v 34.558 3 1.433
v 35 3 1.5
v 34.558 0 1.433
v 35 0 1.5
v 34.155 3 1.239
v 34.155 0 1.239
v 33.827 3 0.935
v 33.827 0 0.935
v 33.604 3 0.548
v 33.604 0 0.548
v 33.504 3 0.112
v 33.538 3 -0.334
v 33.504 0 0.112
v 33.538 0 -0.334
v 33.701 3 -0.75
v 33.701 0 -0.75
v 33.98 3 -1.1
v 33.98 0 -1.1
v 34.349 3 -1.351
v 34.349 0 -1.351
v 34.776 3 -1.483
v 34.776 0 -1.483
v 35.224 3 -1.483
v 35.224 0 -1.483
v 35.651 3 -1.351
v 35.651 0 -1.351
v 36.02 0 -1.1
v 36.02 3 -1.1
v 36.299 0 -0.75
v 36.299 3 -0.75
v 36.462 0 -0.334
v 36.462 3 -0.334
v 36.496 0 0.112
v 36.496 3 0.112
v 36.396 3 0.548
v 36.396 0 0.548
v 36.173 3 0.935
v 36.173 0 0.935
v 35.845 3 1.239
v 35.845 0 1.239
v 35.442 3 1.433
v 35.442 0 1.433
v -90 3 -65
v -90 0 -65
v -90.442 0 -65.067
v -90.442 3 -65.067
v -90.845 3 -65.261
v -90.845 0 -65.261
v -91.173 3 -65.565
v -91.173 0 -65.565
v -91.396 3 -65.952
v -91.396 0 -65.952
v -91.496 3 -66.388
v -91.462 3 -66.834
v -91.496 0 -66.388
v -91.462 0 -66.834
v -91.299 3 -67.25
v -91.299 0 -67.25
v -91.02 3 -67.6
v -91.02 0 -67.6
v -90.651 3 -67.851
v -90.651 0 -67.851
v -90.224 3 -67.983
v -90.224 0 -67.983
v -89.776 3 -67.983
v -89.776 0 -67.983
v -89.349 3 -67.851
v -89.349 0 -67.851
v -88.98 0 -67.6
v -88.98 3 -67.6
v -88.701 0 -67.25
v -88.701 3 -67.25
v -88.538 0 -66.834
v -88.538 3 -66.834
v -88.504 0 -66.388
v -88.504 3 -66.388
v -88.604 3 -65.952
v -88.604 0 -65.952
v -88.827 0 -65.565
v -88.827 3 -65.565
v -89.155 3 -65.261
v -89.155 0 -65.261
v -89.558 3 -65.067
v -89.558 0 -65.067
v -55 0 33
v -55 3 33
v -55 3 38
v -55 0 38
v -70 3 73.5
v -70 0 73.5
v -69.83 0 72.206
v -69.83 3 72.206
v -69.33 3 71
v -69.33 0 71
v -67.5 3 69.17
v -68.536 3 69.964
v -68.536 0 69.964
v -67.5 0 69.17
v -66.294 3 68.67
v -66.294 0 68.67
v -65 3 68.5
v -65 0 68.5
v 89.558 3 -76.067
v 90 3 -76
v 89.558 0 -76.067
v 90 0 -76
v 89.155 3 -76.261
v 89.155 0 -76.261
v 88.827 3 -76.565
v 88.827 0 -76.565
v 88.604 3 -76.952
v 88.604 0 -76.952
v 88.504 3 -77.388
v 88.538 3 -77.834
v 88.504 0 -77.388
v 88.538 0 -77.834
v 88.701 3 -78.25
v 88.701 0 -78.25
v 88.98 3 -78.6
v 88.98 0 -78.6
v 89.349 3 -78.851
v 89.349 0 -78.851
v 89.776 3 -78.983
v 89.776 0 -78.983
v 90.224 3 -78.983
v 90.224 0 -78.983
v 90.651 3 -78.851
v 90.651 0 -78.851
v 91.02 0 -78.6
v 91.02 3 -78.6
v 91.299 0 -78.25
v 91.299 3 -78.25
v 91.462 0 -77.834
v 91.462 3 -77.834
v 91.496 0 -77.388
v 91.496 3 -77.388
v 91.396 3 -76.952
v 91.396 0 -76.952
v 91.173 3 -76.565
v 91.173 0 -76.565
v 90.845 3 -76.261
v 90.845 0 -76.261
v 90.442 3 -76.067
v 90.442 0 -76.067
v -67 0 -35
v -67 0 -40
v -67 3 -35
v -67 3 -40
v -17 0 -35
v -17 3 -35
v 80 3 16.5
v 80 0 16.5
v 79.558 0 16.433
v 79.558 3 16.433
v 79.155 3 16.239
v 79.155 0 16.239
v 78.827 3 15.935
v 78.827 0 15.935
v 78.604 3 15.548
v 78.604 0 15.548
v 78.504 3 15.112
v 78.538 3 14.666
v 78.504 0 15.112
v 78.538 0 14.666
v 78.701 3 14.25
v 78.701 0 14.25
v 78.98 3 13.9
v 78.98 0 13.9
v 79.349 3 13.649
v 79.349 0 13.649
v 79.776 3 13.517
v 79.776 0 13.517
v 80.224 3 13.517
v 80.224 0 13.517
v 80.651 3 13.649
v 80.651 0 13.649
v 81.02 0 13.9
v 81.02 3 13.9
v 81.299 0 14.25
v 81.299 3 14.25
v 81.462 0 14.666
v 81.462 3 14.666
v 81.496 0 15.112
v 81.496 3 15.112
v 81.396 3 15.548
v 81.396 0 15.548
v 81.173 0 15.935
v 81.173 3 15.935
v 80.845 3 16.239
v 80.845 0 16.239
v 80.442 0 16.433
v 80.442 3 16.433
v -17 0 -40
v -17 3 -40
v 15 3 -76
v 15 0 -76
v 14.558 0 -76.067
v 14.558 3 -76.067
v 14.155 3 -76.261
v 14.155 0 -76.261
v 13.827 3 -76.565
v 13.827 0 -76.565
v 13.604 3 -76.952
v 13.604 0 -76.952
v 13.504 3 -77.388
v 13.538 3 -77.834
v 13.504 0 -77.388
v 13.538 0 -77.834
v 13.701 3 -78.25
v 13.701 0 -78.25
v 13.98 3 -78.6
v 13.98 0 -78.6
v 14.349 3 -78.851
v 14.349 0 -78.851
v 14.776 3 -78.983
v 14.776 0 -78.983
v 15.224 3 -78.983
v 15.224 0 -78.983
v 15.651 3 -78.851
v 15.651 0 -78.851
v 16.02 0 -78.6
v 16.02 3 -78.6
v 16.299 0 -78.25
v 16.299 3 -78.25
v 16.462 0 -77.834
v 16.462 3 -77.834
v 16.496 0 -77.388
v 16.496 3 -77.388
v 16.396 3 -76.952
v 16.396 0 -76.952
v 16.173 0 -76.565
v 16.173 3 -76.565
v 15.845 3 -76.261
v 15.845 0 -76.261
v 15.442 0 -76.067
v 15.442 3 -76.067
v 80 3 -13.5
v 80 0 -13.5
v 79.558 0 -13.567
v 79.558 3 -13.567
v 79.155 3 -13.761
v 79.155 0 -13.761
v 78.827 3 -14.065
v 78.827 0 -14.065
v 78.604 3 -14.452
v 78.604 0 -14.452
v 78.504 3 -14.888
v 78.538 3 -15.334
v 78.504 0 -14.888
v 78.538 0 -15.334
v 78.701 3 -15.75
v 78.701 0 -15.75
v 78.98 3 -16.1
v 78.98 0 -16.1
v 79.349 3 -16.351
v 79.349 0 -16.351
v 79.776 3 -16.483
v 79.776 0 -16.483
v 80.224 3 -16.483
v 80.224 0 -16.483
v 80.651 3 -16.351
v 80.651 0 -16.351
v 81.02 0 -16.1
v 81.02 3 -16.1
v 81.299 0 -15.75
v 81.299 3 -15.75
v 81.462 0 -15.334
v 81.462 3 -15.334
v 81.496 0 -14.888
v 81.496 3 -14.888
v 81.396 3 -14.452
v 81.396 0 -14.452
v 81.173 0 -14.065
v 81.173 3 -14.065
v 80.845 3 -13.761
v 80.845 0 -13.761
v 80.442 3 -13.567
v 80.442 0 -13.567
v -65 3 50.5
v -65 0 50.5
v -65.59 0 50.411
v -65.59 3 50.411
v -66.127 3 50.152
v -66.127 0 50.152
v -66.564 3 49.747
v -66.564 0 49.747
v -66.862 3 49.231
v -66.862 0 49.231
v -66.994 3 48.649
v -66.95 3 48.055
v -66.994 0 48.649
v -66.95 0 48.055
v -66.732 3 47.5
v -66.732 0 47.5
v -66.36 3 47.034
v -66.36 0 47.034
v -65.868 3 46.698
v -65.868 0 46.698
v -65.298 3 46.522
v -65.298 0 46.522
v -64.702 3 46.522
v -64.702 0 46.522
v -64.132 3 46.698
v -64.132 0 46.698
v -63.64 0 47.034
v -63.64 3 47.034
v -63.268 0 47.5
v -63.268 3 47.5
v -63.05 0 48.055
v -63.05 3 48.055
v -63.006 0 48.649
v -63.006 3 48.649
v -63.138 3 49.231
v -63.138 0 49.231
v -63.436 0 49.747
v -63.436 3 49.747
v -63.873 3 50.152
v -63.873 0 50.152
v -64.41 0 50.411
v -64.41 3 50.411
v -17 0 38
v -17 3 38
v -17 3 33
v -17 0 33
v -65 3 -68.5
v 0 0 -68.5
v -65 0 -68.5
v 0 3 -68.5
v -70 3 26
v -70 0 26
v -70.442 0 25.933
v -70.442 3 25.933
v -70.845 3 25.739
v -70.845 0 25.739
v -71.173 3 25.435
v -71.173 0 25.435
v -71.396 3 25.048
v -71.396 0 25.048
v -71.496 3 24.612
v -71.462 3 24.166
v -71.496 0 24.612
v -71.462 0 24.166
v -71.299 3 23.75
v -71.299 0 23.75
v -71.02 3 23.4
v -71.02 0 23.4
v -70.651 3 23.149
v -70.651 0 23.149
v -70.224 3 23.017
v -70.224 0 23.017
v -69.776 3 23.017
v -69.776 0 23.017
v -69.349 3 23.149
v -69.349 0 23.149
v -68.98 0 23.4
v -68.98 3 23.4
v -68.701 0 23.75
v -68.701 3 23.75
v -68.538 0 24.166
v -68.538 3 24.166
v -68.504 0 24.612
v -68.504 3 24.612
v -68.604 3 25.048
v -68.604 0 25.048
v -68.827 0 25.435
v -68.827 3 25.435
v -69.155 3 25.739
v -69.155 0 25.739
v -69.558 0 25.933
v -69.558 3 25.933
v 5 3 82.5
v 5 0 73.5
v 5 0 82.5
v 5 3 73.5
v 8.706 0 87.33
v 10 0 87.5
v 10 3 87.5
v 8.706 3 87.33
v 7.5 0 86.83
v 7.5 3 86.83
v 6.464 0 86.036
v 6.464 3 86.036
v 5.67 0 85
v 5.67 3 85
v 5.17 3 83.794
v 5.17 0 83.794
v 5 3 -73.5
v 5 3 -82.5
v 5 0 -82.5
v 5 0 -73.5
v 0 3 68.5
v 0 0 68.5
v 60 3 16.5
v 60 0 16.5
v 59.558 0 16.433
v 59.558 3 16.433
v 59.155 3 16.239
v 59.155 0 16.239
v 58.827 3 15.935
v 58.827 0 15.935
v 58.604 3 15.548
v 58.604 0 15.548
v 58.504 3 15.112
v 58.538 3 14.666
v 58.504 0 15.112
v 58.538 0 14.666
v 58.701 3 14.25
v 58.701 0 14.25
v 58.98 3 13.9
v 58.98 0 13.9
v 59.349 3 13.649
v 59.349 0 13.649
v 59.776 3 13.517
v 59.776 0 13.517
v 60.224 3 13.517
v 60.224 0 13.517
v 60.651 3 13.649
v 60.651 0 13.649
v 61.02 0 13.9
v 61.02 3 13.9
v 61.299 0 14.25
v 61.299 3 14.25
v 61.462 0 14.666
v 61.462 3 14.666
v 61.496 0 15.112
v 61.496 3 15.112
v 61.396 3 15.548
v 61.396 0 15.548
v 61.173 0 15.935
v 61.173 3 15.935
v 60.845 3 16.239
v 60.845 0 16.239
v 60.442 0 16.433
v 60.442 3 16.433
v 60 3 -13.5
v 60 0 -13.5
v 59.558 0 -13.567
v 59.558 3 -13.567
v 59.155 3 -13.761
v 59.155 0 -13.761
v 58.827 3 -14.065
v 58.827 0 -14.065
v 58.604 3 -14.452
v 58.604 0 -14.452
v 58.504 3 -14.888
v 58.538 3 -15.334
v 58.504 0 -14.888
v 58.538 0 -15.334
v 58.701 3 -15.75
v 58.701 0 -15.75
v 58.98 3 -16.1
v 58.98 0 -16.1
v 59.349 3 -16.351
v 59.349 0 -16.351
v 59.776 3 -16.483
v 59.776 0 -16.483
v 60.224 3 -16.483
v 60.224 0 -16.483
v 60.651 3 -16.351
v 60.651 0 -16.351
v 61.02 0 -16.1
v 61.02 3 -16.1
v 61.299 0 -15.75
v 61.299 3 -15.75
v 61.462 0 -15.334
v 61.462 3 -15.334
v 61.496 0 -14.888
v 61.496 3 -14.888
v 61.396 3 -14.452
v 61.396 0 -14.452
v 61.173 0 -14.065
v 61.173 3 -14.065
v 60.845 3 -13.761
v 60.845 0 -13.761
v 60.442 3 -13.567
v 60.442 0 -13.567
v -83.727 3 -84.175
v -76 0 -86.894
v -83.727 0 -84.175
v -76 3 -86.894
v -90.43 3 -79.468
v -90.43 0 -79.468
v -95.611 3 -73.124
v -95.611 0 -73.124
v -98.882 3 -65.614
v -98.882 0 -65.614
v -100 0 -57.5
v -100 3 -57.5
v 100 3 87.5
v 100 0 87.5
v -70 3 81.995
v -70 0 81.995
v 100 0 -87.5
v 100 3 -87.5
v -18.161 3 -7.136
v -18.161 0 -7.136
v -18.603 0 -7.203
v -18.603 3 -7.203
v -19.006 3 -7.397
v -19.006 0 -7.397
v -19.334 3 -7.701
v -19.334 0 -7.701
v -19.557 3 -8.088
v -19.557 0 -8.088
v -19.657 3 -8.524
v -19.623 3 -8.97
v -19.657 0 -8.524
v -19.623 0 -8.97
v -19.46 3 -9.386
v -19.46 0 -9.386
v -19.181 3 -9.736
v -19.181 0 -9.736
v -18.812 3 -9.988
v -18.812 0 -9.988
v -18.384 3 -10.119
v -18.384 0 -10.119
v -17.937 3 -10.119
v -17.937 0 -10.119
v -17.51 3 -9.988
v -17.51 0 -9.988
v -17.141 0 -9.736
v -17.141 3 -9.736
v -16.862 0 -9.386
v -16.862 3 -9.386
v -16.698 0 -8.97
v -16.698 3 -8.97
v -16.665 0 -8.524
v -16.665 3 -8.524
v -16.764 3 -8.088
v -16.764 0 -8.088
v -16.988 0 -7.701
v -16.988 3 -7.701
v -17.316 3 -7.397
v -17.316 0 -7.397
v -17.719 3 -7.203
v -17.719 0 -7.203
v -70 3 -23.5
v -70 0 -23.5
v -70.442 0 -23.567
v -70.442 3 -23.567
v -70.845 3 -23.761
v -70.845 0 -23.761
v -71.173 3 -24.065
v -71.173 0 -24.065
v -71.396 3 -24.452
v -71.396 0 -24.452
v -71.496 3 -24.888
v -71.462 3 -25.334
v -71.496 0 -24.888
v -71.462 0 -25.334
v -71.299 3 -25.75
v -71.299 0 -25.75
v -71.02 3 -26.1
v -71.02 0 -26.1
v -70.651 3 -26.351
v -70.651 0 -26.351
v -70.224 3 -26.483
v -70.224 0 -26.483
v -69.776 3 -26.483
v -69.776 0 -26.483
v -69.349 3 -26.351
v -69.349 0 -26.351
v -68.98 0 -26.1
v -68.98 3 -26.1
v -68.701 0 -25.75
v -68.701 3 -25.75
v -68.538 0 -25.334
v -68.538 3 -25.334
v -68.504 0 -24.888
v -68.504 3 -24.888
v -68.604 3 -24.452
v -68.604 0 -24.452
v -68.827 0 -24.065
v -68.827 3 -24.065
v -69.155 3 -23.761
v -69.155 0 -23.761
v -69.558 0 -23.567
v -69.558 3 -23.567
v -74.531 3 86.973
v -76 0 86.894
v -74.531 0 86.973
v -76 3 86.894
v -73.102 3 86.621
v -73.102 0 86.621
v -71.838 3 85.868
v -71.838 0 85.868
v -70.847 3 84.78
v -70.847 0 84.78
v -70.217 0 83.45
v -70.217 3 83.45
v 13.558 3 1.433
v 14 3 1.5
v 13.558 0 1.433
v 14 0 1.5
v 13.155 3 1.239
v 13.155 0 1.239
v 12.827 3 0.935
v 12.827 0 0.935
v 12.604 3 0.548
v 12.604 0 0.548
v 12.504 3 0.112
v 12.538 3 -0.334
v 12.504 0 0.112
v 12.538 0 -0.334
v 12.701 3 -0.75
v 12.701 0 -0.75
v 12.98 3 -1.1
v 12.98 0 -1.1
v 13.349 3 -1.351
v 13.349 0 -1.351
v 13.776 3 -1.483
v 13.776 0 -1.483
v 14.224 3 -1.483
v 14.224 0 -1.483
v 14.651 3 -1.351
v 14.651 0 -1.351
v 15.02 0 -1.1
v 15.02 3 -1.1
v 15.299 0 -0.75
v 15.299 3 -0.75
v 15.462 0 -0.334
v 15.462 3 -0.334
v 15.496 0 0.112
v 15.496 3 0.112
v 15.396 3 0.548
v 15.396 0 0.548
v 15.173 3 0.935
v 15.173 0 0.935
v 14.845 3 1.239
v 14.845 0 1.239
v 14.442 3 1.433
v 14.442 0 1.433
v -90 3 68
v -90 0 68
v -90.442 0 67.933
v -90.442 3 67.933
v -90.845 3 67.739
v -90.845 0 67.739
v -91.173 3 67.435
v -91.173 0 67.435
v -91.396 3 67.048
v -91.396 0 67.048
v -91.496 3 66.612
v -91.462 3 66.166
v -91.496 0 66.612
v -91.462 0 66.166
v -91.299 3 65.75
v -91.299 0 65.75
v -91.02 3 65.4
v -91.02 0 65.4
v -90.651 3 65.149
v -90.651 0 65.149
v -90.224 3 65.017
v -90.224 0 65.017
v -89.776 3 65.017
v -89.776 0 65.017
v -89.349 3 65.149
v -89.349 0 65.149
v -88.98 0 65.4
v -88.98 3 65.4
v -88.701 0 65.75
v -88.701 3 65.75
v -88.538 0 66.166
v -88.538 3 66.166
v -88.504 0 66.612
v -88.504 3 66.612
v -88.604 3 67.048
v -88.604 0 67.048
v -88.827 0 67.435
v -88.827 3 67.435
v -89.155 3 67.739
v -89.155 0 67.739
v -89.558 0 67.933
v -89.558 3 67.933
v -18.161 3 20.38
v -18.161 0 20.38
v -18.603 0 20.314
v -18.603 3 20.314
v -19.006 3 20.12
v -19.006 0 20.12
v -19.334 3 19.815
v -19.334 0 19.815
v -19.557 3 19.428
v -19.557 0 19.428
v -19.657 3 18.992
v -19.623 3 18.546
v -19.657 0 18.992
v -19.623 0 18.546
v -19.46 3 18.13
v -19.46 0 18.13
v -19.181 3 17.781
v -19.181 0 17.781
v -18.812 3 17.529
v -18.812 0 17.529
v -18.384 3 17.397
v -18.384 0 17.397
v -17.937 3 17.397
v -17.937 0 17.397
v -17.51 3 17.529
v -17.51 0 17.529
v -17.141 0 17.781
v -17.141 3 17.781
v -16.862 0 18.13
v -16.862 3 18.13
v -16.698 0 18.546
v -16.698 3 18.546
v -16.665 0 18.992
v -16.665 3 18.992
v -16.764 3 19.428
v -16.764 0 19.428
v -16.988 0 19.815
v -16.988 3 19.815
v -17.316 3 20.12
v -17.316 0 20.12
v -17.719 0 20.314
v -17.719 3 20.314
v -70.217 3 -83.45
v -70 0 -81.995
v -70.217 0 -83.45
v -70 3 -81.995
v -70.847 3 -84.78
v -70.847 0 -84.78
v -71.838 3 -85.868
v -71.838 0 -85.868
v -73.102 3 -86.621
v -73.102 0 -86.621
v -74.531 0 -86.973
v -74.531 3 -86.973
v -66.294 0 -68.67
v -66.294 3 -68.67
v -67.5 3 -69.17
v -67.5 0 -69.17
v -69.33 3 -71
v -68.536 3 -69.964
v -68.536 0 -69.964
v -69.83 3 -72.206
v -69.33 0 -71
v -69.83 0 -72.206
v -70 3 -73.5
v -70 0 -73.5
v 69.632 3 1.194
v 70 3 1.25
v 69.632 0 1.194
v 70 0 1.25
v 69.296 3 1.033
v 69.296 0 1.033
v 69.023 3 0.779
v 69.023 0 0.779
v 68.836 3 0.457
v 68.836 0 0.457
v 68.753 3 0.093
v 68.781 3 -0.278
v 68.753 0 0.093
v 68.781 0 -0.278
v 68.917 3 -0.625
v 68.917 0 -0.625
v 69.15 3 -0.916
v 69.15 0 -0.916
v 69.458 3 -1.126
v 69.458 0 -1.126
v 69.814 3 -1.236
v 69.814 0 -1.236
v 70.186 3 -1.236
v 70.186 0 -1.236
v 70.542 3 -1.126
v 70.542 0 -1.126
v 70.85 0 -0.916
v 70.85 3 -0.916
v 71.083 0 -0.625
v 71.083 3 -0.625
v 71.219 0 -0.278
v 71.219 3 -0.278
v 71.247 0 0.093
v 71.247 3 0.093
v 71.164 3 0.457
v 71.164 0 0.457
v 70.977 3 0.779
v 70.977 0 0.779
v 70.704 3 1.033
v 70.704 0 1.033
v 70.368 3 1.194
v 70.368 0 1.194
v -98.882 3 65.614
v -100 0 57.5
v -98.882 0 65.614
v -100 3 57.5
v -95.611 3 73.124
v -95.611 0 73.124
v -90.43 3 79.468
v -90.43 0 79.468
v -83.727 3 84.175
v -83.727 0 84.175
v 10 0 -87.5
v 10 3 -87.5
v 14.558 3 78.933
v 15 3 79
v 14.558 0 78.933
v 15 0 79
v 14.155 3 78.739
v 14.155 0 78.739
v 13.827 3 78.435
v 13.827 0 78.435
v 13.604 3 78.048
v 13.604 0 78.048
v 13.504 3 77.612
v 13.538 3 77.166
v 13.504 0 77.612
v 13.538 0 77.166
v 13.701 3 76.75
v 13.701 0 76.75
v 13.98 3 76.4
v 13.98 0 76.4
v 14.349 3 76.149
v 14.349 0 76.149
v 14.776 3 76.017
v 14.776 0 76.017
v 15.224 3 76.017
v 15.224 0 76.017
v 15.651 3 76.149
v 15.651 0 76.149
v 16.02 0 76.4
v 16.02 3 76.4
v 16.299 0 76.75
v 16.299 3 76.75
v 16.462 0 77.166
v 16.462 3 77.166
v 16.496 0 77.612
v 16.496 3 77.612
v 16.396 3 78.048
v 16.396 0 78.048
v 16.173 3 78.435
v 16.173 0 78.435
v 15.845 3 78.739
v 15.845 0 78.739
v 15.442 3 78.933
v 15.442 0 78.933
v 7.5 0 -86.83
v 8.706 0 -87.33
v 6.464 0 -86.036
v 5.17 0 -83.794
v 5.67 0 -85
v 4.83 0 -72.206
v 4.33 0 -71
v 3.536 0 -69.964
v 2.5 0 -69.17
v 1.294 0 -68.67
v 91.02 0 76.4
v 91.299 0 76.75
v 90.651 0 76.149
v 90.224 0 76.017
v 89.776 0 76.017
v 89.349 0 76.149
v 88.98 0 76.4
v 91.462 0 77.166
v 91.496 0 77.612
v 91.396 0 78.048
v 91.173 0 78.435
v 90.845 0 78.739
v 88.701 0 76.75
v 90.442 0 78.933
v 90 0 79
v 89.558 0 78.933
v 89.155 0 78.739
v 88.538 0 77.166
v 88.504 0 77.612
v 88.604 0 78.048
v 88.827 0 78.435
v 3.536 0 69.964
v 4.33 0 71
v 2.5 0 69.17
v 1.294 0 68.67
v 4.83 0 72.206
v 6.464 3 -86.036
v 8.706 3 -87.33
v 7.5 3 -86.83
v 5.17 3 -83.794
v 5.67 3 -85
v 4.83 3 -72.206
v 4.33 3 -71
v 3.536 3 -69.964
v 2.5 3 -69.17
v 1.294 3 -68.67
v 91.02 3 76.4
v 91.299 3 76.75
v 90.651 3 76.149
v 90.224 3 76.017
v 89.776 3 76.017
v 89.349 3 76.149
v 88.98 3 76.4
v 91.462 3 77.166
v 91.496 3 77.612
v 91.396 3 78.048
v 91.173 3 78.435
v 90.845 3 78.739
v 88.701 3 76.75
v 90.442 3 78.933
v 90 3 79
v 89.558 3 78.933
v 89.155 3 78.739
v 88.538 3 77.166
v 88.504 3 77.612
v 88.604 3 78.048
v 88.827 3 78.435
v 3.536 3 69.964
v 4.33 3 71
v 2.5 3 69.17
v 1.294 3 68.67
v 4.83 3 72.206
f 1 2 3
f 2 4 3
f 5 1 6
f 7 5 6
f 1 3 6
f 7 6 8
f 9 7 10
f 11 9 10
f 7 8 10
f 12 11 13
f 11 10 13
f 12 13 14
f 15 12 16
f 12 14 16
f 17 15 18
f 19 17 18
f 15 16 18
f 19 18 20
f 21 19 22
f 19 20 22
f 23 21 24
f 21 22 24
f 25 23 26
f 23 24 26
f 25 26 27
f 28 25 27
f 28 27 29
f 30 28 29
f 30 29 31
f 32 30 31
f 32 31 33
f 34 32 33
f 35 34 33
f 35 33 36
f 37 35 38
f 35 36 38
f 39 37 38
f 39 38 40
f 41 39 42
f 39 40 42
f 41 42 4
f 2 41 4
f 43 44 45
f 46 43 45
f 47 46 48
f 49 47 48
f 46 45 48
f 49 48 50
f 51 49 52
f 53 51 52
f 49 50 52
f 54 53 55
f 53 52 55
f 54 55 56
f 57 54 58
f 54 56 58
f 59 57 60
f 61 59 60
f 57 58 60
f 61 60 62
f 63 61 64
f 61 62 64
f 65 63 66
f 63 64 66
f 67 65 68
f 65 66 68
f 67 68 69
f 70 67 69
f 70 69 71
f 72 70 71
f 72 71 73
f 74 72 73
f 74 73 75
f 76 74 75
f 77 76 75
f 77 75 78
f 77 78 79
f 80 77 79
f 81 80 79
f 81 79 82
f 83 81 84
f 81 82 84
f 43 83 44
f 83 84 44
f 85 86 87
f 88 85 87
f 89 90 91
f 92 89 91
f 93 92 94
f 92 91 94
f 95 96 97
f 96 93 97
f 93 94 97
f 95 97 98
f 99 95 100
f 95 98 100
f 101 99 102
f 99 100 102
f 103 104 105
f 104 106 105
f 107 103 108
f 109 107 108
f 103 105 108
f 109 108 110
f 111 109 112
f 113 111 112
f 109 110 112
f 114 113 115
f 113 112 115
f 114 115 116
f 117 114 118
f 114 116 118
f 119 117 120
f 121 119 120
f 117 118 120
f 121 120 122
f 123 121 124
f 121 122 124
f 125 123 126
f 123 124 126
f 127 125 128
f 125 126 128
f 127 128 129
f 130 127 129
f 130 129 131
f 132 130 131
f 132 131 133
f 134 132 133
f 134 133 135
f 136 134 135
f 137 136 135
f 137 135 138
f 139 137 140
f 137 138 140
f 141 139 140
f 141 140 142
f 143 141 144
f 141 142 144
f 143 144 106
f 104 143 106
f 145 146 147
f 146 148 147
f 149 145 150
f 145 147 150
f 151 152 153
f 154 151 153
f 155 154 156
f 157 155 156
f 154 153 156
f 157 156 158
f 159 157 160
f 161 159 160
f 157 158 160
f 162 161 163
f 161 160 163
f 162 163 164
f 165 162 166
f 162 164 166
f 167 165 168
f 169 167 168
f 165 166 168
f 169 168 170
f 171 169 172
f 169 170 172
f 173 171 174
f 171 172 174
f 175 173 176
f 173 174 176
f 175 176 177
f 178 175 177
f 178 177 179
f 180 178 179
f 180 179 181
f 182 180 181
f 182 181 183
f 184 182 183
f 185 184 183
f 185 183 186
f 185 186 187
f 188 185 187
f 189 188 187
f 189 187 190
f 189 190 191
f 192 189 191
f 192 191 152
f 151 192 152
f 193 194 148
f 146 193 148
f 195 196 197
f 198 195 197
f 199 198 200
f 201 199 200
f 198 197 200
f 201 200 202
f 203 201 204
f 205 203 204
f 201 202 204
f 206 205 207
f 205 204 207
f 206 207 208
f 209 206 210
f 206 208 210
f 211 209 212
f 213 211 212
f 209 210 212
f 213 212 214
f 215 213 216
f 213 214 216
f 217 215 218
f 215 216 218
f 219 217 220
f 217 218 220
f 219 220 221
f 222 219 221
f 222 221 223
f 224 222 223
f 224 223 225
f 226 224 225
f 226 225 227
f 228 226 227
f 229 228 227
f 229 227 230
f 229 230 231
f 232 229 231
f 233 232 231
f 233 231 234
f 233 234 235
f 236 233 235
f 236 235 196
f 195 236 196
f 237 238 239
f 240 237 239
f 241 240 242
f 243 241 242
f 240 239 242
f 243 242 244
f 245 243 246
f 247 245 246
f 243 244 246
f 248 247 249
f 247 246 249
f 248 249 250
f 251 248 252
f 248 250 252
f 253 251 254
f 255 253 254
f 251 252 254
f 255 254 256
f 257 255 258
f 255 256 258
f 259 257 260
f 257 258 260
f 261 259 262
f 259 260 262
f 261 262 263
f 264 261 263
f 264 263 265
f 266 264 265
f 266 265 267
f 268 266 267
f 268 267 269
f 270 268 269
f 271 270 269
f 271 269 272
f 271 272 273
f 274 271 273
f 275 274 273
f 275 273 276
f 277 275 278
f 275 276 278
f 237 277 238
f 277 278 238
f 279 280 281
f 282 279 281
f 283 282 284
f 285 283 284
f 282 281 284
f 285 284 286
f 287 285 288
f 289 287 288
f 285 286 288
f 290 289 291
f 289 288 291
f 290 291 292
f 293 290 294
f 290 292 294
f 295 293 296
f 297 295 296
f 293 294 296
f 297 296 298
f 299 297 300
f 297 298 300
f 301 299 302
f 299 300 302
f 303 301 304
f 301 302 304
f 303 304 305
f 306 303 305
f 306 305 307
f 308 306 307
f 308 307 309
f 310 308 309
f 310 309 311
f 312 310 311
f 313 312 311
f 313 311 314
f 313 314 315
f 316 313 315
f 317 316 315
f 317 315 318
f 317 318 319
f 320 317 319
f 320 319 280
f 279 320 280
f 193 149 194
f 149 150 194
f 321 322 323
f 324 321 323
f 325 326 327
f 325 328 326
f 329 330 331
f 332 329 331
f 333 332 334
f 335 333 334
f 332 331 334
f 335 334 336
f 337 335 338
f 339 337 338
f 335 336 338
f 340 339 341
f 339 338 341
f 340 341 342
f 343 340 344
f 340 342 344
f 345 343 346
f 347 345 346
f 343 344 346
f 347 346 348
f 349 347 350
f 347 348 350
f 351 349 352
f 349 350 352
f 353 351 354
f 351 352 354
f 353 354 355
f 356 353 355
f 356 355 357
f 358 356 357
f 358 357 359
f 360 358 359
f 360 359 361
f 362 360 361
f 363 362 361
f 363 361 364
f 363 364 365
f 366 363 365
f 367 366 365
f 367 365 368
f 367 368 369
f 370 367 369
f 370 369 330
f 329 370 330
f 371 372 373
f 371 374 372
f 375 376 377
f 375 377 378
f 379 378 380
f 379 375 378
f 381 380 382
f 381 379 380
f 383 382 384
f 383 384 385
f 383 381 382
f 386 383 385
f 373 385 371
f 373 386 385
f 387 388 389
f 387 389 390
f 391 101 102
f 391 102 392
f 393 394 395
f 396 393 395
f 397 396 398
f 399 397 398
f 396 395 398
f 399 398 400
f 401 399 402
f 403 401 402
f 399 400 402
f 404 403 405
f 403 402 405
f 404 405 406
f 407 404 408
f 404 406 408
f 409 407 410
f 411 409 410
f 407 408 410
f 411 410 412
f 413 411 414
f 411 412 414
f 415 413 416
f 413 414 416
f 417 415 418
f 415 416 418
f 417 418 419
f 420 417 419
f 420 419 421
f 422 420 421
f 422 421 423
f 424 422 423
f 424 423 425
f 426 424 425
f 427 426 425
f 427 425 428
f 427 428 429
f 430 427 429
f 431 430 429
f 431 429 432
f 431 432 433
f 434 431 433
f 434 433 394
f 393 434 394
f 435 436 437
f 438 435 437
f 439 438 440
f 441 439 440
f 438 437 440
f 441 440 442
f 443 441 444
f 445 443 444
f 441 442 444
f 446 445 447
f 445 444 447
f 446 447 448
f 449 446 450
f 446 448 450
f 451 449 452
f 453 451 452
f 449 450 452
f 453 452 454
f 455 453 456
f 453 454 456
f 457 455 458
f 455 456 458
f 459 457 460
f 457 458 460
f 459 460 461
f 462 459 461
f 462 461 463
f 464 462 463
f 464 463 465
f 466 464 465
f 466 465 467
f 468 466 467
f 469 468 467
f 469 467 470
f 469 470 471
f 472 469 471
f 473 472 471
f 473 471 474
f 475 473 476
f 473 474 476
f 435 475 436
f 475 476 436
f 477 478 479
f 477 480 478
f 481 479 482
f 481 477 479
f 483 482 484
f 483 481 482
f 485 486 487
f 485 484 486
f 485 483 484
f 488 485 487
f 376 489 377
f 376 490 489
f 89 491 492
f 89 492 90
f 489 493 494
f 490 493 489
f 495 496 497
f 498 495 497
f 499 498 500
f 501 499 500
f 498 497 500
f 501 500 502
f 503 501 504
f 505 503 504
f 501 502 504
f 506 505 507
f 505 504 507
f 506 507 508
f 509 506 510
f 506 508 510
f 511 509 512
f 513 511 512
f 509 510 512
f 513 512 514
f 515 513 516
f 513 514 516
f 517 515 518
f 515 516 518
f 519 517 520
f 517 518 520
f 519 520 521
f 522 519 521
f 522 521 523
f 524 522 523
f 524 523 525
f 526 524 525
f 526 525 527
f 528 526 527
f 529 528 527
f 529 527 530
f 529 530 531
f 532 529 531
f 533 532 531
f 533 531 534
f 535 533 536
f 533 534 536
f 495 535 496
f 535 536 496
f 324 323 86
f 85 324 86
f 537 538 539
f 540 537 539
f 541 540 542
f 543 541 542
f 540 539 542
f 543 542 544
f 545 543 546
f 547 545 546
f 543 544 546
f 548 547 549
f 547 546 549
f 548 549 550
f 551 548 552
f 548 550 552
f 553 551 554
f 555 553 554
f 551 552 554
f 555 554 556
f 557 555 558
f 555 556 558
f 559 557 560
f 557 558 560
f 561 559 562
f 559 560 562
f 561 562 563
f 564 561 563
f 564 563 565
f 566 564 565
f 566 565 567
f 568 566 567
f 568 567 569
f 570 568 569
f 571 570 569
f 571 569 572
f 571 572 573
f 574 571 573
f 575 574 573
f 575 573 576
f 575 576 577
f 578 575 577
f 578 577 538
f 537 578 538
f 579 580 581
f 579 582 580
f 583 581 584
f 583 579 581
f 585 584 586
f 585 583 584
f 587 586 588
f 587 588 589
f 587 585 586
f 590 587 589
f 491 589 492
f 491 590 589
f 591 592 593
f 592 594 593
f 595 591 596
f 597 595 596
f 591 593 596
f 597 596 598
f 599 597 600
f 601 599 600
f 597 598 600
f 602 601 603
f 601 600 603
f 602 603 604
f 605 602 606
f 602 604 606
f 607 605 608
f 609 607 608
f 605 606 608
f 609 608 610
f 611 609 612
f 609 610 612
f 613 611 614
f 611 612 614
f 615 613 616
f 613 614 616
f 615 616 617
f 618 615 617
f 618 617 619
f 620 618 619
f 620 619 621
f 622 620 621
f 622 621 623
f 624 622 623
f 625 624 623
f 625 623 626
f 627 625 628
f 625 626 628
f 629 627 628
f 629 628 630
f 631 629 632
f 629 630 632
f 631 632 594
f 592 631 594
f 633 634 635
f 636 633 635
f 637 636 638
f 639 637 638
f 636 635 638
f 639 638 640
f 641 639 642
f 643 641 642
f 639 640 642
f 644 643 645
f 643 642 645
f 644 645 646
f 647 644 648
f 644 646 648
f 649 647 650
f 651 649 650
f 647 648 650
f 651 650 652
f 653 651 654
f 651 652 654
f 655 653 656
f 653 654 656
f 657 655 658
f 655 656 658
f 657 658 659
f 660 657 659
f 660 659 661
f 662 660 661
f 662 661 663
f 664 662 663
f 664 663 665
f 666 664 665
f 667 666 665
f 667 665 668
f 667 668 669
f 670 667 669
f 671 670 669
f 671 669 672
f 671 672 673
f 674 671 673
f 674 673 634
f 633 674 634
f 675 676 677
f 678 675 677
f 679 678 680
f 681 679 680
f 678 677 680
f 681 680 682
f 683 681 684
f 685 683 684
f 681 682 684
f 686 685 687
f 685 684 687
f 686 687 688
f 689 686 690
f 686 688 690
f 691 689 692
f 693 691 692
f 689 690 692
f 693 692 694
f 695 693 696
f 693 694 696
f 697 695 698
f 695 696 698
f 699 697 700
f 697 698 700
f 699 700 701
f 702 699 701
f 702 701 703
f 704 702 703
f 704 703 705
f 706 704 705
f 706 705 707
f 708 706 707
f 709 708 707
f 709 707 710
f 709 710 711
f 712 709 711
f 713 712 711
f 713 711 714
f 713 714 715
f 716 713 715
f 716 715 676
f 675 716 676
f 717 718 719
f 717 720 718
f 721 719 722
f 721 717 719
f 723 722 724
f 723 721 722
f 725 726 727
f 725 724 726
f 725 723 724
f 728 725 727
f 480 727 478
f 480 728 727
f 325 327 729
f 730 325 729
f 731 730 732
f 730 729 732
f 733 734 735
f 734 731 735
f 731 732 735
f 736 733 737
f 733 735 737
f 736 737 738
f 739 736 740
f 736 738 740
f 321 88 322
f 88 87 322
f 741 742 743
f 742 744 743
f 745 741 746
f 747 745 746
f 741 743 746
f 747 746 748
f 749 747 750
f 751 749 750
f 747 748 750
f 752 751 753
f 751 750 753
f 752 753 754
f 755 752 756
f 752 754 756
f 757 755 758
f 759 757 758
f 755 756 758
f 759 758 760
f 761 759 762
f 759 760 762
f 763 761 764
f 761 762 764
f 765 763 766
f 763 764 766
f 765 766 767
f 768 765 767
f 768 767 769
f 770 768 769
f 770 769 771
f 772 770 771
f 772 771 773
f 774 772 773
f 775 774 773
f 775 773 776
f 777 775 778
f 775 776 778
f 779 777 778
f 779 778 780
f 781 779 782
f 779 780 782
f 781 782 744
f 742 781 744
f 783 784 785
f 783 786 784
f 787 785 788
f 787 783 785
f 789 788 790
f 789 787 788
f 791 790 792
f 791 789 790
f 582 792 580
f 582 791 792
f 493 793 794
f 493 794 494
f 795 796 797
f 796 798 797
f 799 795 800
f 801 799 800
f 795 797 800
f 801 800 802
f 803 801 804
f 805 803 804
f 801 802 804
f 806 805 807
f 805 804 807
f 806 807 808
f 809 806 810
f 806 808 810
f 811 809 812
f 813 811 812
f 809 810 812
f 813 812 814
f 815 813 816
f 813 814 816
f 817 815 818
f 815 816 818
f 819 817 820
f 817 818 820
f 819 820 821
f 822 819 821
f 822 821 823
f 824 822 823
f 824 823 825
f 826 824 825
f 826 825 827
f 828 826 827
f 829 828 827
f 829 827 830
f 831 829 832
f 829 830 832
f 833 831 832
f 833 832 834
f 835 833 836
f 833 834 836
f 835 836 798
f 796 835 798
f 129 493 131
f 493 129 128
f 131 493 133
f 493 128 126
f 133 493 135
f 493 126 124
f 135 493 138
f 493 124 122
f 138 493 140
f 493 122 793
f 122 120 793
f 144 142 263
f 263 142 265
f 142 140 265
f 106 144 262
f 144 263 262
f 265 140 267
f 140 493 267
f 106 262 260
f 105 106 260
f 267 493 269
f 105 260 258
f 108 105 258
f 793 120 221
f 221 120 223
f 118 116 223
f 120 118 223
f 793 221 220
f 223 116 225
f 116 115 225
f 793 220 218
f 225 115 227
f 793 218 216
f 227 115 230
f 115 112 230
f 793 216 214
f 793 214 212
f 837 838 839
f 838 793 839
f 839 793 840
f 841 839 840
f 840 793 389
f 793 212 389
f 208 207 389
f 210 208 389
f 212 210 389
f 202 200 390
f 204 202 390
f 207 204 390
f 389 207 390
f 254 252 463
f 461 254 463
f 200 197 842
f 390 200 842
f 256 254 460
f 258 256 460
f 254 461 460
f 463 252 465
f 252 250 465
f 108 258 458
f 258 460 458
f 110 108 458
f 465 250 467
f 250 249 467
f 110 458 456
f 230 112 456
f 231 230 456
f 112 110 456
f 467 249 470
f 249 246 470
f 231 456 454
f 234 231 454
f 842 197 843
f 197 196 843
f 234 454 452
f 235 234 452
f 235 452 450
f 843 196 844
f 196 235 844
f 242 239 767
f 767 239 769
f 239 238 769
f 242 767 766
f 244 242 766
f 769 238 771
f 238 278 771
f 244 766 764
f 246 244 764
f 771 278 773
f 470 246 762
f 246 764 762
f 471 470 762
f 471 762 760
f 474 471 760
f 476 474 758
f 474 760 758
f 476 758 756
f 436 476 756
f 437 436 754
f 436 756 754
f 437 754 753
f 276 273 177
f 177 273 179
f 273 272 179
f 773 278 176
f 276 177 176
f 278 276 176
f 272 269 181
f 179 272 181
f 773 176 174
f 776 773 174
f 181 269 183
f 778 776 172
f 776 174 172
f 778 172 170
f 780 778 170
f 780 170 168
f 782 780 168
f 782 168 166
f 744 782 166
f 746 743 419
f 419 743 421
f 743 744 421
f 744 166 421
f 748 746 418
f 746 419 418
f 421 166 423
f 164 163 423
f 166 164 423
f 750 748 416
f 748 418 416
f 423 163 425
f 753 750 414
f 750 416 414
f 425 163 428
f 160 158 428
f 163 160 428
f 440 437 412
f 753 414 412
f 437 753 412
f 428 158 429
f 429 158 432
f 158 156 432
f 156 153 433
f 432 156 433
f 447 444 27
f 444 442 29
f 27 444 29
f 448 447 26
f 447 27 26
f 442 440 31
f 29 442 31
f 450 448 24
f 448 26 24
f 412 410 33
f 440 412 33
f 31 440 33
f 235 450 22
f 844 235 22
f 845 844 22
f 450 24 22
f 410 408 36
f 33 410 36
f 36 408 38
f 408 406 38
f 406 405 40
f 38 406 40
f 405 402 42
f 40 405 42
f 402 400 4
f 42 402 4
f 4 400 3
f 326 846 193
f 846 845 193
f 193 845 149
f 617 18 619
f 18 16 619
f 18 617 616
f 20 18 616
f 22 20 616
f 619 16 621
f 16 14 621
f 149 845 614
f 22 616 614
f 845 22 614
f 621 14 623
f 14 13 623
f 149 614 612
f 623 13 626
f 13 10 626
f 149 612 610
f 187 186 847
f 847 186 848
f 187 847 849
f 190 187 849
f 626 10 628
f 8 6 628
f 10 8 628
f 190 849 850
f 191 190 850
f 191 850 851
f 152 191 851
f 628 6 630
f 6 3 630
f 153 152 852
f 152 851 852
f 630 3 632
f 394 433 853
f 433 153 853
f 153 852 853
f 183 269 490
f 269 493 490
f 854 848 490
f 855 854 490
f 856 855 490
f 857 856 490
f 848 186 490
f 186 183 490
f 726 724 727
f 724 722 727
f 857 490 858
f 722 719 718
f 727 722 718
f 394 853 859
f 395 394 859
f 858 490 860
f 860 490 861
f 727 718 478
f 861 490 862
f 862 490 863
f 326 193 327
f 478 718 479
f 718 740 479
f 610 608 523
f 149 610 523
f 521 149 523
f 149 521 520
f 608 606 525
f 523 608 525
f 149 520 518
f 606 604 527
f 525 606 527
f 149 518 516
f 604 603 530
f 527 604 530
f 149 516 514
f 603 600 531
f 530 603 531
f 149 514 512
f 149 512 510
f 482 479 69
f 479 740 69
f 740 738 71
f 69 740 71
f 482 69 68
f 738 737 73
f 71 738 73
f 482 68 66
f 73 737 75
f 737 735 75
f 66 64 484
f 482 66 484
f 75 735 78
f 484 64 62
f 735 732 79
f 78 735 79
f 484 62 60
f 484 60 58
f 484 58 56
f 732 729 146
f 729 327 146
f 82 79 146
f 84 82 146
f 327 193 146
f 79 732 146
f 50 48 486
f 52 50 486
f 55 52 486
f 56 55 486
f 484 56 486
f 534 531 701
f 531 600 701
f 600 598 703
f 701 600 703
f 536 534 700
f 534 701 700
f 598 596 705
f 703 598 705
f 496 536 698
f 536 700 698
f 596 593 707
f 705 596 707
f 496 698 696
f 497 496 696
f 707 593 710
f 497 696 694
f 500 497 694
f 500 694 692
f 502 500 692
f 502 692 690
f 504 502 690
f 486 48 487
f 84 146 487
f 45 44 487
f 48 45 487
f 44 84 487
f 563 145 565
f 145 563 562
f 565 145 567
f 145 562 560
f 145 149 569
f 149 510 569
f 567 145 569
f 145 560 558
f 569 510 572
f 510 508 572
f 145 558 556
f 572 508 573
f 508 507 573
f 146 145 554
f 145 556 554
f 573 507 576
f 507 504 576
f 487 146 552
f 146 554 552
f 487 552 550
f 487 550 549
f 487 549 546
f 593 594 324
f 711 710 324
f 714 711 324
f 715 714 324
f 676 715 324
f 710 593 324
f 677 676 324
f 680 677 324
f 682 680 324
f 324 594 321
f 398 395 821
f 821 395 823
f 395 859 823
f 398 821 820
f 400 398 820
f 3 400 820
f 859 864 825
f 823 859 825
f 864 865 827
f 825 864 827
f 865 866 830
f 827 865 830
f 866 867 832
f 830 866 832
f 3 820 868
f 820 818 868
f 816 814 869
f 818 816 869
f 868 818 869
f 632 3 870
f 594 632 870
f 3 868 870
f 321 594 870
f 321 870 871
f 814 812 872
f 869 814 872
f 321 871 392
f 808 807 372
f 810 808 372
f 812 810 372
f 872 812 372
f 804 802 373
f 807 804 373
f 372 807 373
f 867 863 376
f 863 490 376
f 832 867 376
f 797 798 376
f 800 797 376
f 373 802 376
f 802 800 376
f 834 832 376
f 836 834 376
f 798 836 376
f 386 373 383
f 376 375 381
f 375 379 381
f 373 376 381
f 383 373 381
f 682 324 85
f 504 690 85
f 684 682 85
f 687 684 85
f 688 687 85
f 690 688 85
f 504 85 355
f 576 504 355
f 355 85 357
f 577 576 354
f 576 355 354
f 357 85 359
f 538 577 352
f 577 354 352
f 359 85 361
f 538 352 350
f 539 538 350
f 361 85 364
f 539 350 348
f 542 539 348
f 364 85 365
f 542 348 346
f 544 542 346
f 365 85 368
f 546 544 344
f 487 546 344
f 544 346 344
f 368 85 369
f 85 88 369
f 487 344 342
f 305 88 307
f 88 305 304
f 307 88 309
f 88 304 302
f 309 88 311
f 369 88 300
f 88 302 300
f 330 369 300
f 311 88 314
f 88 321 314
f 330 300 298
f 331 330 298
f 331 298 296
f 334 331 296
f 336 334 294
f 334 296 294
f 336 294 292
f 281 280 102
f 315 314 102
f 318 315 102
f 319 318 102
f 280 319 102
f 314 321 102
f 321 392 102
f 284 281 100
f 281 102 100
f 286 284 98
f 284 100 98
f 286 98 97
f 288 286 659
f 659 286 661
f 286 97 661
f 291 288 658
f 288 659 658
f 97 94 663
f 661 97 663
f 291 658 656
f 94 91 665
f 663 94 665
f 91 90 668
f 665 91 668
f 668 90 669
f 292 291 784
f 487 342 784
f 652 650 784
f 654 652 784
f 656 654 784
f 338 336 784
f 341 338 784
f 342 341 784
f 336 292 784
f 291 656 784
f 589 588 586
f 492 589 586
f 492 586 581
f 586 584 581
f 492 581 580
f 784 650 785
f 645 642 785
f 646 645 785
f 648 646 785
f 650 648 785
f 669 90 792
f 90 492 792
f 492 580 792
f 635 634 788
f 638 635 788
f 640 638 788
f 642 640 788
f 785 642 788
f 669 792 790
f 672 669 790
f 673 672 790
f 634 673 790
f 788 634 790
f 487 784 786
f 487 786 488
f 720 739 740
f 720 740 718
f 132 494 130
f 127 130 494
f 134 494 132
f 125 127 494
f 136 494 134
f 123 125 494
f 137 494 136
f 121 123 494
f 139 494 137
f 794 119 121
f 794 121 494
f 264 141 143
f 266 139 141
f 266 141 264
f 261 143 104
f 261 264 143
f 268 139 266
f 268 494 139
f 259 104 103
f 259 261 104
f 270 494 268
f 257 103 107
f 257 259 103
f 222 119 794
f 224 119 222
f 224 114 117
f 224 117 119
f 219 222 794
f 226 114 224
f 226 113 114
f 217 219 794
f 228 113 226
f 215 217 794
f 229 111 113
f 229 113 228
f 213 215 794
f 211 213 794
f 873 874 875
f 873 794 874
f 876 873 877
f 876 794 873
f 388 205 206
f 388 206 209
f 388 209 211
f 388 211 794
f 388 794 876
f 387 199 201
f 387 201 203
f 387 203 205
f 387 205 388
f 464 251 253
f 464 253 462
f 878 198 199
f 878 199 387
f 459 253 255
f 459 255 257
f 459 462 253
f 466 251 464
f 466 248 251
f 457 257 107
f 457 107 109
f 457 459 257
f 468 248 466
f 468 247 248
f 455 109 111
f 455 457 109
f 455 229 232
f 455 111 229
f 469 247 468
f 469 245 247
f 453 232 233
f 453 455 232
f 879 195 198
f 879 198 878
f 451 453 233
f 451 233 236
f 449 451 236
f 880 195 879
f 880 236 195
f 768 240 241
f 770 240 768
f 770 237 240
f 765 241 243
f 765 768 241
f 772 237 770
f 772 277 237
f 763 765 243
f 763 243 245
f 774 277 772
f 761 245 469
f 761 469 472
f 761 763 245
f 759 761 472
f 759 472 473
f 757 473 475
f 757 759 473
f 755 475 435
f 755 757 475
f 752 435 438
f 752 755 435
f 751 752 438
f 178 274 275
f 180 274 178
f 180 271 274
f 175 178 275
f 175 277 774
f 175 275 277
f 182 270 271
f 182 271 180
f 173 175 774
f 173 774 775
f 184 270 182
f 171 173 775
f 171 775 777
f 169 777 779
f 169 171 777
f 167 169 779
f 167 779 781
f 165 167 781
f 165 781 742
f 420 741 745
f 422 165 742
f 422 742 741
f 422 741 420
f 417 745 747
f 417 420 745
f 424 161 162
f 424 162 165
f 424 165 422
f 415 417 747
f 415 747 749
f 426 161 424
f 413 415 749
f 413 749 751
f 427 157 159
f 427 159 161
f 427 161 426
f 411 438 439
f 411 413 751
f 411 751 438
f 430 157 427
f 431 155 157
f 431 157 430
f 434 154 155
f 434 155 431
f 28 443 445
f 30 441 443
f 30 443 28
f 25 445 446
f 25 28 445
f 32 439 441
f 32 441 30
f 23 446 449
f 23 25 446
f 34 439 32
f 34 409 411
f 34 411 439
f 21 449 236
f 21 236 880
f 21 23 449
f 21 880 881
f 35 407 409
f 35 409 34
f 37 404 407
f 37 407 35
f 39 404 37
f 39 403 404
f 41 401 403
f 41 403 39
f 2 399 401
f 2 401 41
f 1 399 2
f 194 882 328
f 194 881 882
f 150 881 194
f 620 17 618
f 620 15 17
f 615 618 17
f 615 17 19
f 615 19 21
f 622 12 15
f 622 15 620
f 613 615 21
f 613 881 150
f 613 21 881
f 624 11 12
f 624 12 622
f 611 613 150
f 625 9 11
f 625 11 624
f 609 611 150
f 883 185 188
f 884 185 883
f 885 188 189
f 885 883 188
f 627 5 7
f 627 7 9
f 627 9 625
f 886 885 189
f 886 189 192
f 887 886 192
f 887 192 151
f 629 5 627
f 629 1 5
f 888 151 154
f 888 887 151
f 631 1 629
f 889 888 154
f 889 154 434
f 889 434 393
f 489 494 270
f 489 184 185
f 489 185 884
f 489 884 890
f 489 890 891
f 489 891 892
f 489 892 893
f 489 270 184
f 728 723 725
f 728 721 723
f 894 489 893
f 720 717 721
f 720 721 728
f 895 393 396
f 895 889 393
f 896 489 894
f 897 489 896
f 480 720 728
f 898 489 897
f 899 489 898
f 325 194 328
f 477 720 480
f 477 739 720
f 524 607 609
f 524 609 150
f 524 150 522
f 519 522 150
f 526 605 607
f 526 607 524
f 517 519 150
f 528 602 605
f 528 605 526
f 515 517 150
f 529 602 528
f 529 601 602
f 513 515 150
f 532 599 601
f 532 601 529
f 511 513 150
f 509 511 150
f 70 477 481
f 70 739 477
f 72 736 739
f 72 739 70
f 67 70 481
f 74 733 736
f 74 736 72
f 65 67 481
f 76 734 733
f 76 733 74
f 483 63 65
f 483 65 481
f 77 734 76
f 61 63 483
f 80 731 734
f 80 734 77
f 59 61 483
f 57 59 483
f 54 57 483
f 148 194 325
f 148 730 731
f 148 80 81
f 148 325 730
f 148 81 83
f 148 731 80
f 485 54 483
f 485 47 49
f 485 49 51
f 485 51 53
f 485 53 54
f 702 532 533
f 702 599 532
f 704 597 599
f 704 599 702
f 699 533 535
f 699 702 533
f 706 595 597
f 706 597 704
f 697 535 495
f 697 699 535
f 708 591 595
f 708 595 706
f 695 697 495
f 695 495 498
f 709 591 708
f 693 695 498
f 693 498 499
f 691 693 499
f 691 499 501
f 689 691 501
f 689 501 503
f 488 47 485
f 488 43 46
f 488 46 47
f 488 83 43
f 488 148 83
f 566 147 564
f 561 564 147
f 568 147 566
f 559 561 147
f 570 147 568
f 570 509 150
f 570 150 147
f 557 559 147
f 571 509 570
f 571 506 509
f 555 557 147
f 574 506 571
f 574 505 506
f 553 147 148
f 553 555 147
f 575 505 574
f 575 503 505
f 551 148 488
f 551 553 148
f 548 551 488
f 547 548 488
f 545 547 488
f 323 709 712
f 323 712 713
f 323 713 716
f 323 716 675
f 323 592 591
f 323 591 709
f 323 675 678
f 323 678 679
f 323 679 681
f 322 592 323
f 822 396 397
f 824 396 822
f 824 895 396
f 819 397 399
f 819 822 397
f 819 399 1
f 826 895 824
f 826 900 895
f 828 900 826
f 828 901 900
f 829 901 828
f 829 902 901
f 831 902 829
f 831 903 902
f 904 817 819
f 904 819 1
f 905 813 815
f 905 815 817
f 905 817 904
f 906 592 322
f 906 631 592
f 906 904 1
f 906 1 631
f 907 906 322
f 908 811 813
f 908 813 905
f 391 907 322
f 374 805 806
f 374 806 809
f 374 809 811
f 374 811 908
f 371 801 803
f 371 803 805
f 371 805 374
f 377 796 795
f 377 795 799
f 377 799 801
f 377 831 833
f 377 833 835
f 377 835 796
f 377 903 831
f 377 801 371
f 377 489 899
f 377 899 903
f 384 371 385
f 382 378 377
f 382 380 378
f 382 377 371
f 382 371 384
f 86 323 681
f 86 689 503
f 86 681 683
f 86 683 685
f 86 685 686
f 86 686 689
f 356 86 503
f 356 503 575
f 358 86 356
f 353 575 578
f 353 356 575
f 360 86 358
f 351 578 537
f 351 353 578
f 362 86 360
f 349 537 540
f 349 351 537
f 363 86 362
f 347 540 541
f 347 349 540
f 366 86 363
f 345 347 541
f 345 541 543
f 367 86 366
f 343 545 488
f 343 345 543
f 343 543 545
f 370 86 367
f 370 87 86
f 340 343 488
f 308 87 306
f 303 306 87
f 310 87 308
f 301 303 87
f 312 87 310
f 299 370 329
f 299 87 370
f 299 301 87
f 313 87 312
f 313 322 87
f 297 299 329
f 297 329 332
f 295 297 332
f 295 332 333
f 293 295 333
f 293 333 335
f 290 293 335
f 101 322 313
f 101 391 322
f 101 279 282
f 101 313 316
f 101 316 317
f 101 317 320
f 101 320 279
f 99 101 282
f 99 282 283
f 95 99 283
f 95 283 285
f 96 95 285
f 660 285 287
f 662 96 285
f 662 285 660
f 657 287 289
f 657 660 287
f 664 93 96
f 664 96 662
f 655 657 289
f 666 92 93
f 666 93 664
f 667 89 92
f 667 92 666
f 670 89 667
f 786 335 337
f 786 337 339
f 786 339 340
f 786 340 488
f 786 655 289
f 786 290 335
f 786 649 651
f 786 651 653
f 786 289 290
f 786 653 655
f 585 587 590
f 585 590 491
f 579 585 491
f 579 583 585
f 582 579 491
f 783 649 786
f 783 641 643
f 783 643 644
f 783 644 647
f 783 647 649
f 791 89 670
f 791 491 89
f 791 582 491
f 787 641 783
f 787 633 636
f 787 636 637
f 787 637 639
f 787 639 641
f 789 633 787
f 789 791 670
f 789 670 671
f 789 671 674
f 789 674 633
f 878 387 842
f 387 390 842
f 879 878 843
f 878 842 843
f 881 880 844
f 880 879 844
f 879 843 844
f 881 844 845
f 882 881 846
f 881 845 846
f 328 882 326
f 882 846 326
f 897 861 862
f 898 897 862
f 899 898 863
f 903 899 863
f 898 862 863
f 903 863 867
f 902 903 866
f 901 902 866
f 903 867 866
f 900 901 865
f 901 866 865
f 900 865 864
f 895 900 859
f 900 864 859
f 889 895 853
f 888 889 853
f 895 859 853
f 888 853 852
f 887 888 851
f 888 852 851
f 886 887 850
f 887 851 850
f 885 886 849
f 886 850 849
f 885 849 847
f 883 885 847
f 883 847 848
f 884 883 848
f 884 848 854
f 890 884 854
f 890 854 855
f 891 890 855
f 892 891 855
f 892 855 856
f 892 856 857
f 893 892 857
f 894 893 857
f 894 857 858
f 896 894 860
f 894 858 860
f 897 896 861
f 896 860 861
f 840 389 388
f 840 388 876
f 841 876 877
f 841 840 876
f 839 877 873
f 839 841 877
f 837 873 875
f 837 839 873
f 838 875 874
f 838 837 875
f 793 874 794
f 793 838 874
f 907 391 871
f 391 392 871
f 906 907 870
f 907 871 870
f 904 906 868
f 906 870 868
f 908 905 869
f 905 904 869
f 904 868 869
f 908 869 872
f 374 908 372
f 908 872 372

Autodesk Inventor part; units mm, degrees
ref_plane "YZ Plane" through (0, 0, 0) normal (1, 0, 0) x (0, 1, 0)
ref_plane "XZ Plane" through (0, 0, 0) normal (0, 1, 0) x (-1, 0, 0)
ref_plane "XY Plane" through (0, 0, 0) normal (0, 0, 1) x (1, 0, 0)
sketch "Boceto1" plane through (0, 0, 0) normal (0, 1, 0) x (-1, 0, 0)
  line L0 (-100, 87.5) -> (100, 87.5)
  line L1 (100, 87.5) -> (100, -87.5)
  line L2 (100, -87.5) -> (-100, -87.5)
  line L3 (-100, -87.5) -> (-100, 87.5)
  line L4 (-100, 87.5) -> (100, -87.5) construction
  line L5 (100, 87.5) -> (-100, -87.5) construction
  point P0 (0, 0)
  dimension "d0" = 200
  dimension "d1" = 175
extrude "Extrusión1" add sketch "Boceto1" along normal blind 3
fillet "Empalme1" radius 30 2 edges at (-100, 1.5, 87.5) (-100, 1.5, -87.5)
sketch "Boceto2" plane through (0, 3, 0) normal (0, 1, 0) x (1, 0, 0)
  line L0 (100, 87.5) -> (-70, 87.5) projected
  line L1 (-70, 87.5) -> (5, 87.5)
  line L2 (5, 87.5) -> (5, 68.5)
  line L3 (5, 68.5) -> (-70, 68.5)
  line L4 (-70, 68.5) -> (-70, 87.5)
  point P0 (0, 0)
  dimension "d5" = 75
  dimension "d6" = 19
extrude "Extrusión2" cut sketch "Boceto2" against normal blind 3
mirror "Simetría1" about plane through (0, 0, 0) normal (0, 0, 1) of "Extrusión2"
fillet "Empalme3" radius 5 8 edges at (-70, 1.5, -87.5) (-70, 1.5, -68.5) (5, 1.5, -87.5) (5, 1.5, -68.5) (5, 1.5, 87.5) (5, 1.5, 68.5) (-70, 1.5, 87.5) (-70, 1.5, 68.5)
sketch "Boceto3" plane through (0, 3, 0) normal (0, 1, 0) x (1, 0, 0)
  line L0 (-100, 57.5) -> (-100, -57.5) construction
  line L1 (-100, 0) -> (100, 0) construction
  line L2 (100, -87.5) -> (100, 87.5) construction
  point P0 (0, 0)
  point P1 (80, 15)
  point P2 (60, 15)
  point P3 (80, -15)
  point P4 (60, -15)
  dimension "d11" = 20
  dimension "d12" = 30
  dimension "d13" = 15
  dimension "d14" = 20
hole "Agujero1" at (80, 3, -15) at (60, 3, -15) at (60, 3, 15) at (80, 3, 15) direction (0, -1, 0) diameter 3 end through all
sketch "Boceto5" plane through (0, 3, 0) normal (0, 1, 0) x (1, 0, 0)
  circle A0 centre (60, -15) radius 1.5 construction
  point P0 (0, 0)
  point P1 (70, 0)
  dimension "d22" = 15
  dimension "d23" = 10
hole "Agujero2" at (70, 3, 0) direction (0, -1, 0) diameter 2.5 end through all
sketch "Boceto6" plane through (0, 3, 0) normal (0, 1, 0) x (1, 0, 0)
  line L0 (100, -87.5) -> (100, 87.5) construction
  line L1 (100, 0) -> (-100, 0) construction
  line L2 (-100, 57.5) -> (-100, -57.5) construction
  point P0 (0, 0)
  point P1 (35, 0)
  point P2 (14, 0)
  dimension "d31" = 21
  dimension "d32" = 65
hole "Agujero3" at (35, 3, 0) at (14, 3, 0) direction (0, -1, 0) diameter 3 end through all
sketch "Boceto7" plane through (0, 3, 0) normal (0, 1, 0) x (1, 0, 0)
  line L0 (-90, 66.5) -> (-90, -66.5) construction
  line L1 (15, -77.5) -> (90, -77.5) construction
  line L2 (15, 77.5) -> (90, 77.5) construction
  line L3 (10, -87.5) -> (100, -87.5) construction
  line L4 (100, -87.5) -> (100, 87.5) construction
  line L5 (5, -73.5) -> (5, -82.5) construction
  line L6 (100, 87.5) -> (10, 87.5) construction
  line L7 (-100, 57.5) -> (-100, -57.5) construction
  line L8 (-65, -68.5) -> (0, -68.5) construction
  point P0 (0, 0)
  point P1 (-90, 0)
  dimension "d40" = 10
  dimension "d41" = 10
  dimension "d42" = 10
  dimension "d43" = 10
  dimension "d44" = 10
  dimension "d45" = 2
hole "Agujero4" at (-90, 3, 66.5) at (-90, 3, -66.5) at (90, 3, 77.5) at (90, 3, -77.5) at (15, 3, 77.5) at (15, 3, -77.5) direction (0, -1, 0) diameter 3 depth 8 tip angle 118
sketch "Boceto8" plane through (0, 3, 0) normal (0, 1, 0) x (1, 0, 0)
  line L0 (-100, 57.5) -> (-100, -57.5) projected
  point P0 (0, 0)
  point P1 (-70, 25)
  point P2 (-18.1608, 8.6361)
  point P3 (-18.1608, -18.8802)
  point P4 (-70, -24.5)
  point P5 (-100, 0)
  dimension "d53" = 49.5
  dimension "d54" = 51.8392
  dimension "d55" = 16.3639
  dimension "d56" = 27.5163
  dimension "d57" = 30
  dimension "d58" = 25
hole "Agujero5" at (-70, 3, -25) at (-18.1608, 3, -8.6361) at (-18.1608, 3, 18.8802) at (-70, 3, 24.5) direction (0, -1, 0) diameter 3 end through all
sketch "Boceto9" plane through (0, 3, 0) normal (0, 1, 0) x (1, 0, 0)
  line L0 (-17, 40) -> (-67, 40)
  line L1 (-67, 40) -> (-67, 35)
  line L2 (-67, 35) -> (-17, 35)
  line L3 (-17, 35) -> (-17, 40)
  line L4 (-100, 57.5) -> (-100, -57.5) projected
  point P0 (0, 0)
  point P1 (-100, 0)
  dimension "d66" = 5
  dimension "d67" = 33
  dimension "d68" = 50
  dimension "d69" = 35
extrude "Extrusión3" cut sketch "Boceto9" against normal through all
sketch "Boceto10" plane through (0, 3, 0) normal (0, 1, 0) x (1, 0, 0)
  line L0 (-17, -33) -> (-55, -33)
  line L1 (-55, -33) -> (-55, -38)
  line L2 (-55, -38) -> (-17, -38)
  line L3 (-17, -38) -> (-17, -33)
  line L4 (-17, 35) -> (-67, 35) construction
  point P0 (0, 0)
  dimension "d72" = 5
  dimension "d73" = 68
  dimension "d74" = 38
extrude "Extrusión4" cut sketch "Boceto10" against normal through all
sketch "Boceto11" plane through (0, 3, 0) normal (0, 1, 0) x (1, 0, 0)
  line L0 (-100, 57.5) -> (-100, -57.5) projected
  line L1 (-65, -68.5) -> (0, -68.5) projected
  point P0 (0, 0)
  point P1 (-65, -48.5)
  dimension "d77" = 35
  dimension "d78" = 20
hole "Agujero6" at (-65, 3, 48.5) direction (0, -1, 0) diameter 4 end through all
properties part number "Base_Superior"
